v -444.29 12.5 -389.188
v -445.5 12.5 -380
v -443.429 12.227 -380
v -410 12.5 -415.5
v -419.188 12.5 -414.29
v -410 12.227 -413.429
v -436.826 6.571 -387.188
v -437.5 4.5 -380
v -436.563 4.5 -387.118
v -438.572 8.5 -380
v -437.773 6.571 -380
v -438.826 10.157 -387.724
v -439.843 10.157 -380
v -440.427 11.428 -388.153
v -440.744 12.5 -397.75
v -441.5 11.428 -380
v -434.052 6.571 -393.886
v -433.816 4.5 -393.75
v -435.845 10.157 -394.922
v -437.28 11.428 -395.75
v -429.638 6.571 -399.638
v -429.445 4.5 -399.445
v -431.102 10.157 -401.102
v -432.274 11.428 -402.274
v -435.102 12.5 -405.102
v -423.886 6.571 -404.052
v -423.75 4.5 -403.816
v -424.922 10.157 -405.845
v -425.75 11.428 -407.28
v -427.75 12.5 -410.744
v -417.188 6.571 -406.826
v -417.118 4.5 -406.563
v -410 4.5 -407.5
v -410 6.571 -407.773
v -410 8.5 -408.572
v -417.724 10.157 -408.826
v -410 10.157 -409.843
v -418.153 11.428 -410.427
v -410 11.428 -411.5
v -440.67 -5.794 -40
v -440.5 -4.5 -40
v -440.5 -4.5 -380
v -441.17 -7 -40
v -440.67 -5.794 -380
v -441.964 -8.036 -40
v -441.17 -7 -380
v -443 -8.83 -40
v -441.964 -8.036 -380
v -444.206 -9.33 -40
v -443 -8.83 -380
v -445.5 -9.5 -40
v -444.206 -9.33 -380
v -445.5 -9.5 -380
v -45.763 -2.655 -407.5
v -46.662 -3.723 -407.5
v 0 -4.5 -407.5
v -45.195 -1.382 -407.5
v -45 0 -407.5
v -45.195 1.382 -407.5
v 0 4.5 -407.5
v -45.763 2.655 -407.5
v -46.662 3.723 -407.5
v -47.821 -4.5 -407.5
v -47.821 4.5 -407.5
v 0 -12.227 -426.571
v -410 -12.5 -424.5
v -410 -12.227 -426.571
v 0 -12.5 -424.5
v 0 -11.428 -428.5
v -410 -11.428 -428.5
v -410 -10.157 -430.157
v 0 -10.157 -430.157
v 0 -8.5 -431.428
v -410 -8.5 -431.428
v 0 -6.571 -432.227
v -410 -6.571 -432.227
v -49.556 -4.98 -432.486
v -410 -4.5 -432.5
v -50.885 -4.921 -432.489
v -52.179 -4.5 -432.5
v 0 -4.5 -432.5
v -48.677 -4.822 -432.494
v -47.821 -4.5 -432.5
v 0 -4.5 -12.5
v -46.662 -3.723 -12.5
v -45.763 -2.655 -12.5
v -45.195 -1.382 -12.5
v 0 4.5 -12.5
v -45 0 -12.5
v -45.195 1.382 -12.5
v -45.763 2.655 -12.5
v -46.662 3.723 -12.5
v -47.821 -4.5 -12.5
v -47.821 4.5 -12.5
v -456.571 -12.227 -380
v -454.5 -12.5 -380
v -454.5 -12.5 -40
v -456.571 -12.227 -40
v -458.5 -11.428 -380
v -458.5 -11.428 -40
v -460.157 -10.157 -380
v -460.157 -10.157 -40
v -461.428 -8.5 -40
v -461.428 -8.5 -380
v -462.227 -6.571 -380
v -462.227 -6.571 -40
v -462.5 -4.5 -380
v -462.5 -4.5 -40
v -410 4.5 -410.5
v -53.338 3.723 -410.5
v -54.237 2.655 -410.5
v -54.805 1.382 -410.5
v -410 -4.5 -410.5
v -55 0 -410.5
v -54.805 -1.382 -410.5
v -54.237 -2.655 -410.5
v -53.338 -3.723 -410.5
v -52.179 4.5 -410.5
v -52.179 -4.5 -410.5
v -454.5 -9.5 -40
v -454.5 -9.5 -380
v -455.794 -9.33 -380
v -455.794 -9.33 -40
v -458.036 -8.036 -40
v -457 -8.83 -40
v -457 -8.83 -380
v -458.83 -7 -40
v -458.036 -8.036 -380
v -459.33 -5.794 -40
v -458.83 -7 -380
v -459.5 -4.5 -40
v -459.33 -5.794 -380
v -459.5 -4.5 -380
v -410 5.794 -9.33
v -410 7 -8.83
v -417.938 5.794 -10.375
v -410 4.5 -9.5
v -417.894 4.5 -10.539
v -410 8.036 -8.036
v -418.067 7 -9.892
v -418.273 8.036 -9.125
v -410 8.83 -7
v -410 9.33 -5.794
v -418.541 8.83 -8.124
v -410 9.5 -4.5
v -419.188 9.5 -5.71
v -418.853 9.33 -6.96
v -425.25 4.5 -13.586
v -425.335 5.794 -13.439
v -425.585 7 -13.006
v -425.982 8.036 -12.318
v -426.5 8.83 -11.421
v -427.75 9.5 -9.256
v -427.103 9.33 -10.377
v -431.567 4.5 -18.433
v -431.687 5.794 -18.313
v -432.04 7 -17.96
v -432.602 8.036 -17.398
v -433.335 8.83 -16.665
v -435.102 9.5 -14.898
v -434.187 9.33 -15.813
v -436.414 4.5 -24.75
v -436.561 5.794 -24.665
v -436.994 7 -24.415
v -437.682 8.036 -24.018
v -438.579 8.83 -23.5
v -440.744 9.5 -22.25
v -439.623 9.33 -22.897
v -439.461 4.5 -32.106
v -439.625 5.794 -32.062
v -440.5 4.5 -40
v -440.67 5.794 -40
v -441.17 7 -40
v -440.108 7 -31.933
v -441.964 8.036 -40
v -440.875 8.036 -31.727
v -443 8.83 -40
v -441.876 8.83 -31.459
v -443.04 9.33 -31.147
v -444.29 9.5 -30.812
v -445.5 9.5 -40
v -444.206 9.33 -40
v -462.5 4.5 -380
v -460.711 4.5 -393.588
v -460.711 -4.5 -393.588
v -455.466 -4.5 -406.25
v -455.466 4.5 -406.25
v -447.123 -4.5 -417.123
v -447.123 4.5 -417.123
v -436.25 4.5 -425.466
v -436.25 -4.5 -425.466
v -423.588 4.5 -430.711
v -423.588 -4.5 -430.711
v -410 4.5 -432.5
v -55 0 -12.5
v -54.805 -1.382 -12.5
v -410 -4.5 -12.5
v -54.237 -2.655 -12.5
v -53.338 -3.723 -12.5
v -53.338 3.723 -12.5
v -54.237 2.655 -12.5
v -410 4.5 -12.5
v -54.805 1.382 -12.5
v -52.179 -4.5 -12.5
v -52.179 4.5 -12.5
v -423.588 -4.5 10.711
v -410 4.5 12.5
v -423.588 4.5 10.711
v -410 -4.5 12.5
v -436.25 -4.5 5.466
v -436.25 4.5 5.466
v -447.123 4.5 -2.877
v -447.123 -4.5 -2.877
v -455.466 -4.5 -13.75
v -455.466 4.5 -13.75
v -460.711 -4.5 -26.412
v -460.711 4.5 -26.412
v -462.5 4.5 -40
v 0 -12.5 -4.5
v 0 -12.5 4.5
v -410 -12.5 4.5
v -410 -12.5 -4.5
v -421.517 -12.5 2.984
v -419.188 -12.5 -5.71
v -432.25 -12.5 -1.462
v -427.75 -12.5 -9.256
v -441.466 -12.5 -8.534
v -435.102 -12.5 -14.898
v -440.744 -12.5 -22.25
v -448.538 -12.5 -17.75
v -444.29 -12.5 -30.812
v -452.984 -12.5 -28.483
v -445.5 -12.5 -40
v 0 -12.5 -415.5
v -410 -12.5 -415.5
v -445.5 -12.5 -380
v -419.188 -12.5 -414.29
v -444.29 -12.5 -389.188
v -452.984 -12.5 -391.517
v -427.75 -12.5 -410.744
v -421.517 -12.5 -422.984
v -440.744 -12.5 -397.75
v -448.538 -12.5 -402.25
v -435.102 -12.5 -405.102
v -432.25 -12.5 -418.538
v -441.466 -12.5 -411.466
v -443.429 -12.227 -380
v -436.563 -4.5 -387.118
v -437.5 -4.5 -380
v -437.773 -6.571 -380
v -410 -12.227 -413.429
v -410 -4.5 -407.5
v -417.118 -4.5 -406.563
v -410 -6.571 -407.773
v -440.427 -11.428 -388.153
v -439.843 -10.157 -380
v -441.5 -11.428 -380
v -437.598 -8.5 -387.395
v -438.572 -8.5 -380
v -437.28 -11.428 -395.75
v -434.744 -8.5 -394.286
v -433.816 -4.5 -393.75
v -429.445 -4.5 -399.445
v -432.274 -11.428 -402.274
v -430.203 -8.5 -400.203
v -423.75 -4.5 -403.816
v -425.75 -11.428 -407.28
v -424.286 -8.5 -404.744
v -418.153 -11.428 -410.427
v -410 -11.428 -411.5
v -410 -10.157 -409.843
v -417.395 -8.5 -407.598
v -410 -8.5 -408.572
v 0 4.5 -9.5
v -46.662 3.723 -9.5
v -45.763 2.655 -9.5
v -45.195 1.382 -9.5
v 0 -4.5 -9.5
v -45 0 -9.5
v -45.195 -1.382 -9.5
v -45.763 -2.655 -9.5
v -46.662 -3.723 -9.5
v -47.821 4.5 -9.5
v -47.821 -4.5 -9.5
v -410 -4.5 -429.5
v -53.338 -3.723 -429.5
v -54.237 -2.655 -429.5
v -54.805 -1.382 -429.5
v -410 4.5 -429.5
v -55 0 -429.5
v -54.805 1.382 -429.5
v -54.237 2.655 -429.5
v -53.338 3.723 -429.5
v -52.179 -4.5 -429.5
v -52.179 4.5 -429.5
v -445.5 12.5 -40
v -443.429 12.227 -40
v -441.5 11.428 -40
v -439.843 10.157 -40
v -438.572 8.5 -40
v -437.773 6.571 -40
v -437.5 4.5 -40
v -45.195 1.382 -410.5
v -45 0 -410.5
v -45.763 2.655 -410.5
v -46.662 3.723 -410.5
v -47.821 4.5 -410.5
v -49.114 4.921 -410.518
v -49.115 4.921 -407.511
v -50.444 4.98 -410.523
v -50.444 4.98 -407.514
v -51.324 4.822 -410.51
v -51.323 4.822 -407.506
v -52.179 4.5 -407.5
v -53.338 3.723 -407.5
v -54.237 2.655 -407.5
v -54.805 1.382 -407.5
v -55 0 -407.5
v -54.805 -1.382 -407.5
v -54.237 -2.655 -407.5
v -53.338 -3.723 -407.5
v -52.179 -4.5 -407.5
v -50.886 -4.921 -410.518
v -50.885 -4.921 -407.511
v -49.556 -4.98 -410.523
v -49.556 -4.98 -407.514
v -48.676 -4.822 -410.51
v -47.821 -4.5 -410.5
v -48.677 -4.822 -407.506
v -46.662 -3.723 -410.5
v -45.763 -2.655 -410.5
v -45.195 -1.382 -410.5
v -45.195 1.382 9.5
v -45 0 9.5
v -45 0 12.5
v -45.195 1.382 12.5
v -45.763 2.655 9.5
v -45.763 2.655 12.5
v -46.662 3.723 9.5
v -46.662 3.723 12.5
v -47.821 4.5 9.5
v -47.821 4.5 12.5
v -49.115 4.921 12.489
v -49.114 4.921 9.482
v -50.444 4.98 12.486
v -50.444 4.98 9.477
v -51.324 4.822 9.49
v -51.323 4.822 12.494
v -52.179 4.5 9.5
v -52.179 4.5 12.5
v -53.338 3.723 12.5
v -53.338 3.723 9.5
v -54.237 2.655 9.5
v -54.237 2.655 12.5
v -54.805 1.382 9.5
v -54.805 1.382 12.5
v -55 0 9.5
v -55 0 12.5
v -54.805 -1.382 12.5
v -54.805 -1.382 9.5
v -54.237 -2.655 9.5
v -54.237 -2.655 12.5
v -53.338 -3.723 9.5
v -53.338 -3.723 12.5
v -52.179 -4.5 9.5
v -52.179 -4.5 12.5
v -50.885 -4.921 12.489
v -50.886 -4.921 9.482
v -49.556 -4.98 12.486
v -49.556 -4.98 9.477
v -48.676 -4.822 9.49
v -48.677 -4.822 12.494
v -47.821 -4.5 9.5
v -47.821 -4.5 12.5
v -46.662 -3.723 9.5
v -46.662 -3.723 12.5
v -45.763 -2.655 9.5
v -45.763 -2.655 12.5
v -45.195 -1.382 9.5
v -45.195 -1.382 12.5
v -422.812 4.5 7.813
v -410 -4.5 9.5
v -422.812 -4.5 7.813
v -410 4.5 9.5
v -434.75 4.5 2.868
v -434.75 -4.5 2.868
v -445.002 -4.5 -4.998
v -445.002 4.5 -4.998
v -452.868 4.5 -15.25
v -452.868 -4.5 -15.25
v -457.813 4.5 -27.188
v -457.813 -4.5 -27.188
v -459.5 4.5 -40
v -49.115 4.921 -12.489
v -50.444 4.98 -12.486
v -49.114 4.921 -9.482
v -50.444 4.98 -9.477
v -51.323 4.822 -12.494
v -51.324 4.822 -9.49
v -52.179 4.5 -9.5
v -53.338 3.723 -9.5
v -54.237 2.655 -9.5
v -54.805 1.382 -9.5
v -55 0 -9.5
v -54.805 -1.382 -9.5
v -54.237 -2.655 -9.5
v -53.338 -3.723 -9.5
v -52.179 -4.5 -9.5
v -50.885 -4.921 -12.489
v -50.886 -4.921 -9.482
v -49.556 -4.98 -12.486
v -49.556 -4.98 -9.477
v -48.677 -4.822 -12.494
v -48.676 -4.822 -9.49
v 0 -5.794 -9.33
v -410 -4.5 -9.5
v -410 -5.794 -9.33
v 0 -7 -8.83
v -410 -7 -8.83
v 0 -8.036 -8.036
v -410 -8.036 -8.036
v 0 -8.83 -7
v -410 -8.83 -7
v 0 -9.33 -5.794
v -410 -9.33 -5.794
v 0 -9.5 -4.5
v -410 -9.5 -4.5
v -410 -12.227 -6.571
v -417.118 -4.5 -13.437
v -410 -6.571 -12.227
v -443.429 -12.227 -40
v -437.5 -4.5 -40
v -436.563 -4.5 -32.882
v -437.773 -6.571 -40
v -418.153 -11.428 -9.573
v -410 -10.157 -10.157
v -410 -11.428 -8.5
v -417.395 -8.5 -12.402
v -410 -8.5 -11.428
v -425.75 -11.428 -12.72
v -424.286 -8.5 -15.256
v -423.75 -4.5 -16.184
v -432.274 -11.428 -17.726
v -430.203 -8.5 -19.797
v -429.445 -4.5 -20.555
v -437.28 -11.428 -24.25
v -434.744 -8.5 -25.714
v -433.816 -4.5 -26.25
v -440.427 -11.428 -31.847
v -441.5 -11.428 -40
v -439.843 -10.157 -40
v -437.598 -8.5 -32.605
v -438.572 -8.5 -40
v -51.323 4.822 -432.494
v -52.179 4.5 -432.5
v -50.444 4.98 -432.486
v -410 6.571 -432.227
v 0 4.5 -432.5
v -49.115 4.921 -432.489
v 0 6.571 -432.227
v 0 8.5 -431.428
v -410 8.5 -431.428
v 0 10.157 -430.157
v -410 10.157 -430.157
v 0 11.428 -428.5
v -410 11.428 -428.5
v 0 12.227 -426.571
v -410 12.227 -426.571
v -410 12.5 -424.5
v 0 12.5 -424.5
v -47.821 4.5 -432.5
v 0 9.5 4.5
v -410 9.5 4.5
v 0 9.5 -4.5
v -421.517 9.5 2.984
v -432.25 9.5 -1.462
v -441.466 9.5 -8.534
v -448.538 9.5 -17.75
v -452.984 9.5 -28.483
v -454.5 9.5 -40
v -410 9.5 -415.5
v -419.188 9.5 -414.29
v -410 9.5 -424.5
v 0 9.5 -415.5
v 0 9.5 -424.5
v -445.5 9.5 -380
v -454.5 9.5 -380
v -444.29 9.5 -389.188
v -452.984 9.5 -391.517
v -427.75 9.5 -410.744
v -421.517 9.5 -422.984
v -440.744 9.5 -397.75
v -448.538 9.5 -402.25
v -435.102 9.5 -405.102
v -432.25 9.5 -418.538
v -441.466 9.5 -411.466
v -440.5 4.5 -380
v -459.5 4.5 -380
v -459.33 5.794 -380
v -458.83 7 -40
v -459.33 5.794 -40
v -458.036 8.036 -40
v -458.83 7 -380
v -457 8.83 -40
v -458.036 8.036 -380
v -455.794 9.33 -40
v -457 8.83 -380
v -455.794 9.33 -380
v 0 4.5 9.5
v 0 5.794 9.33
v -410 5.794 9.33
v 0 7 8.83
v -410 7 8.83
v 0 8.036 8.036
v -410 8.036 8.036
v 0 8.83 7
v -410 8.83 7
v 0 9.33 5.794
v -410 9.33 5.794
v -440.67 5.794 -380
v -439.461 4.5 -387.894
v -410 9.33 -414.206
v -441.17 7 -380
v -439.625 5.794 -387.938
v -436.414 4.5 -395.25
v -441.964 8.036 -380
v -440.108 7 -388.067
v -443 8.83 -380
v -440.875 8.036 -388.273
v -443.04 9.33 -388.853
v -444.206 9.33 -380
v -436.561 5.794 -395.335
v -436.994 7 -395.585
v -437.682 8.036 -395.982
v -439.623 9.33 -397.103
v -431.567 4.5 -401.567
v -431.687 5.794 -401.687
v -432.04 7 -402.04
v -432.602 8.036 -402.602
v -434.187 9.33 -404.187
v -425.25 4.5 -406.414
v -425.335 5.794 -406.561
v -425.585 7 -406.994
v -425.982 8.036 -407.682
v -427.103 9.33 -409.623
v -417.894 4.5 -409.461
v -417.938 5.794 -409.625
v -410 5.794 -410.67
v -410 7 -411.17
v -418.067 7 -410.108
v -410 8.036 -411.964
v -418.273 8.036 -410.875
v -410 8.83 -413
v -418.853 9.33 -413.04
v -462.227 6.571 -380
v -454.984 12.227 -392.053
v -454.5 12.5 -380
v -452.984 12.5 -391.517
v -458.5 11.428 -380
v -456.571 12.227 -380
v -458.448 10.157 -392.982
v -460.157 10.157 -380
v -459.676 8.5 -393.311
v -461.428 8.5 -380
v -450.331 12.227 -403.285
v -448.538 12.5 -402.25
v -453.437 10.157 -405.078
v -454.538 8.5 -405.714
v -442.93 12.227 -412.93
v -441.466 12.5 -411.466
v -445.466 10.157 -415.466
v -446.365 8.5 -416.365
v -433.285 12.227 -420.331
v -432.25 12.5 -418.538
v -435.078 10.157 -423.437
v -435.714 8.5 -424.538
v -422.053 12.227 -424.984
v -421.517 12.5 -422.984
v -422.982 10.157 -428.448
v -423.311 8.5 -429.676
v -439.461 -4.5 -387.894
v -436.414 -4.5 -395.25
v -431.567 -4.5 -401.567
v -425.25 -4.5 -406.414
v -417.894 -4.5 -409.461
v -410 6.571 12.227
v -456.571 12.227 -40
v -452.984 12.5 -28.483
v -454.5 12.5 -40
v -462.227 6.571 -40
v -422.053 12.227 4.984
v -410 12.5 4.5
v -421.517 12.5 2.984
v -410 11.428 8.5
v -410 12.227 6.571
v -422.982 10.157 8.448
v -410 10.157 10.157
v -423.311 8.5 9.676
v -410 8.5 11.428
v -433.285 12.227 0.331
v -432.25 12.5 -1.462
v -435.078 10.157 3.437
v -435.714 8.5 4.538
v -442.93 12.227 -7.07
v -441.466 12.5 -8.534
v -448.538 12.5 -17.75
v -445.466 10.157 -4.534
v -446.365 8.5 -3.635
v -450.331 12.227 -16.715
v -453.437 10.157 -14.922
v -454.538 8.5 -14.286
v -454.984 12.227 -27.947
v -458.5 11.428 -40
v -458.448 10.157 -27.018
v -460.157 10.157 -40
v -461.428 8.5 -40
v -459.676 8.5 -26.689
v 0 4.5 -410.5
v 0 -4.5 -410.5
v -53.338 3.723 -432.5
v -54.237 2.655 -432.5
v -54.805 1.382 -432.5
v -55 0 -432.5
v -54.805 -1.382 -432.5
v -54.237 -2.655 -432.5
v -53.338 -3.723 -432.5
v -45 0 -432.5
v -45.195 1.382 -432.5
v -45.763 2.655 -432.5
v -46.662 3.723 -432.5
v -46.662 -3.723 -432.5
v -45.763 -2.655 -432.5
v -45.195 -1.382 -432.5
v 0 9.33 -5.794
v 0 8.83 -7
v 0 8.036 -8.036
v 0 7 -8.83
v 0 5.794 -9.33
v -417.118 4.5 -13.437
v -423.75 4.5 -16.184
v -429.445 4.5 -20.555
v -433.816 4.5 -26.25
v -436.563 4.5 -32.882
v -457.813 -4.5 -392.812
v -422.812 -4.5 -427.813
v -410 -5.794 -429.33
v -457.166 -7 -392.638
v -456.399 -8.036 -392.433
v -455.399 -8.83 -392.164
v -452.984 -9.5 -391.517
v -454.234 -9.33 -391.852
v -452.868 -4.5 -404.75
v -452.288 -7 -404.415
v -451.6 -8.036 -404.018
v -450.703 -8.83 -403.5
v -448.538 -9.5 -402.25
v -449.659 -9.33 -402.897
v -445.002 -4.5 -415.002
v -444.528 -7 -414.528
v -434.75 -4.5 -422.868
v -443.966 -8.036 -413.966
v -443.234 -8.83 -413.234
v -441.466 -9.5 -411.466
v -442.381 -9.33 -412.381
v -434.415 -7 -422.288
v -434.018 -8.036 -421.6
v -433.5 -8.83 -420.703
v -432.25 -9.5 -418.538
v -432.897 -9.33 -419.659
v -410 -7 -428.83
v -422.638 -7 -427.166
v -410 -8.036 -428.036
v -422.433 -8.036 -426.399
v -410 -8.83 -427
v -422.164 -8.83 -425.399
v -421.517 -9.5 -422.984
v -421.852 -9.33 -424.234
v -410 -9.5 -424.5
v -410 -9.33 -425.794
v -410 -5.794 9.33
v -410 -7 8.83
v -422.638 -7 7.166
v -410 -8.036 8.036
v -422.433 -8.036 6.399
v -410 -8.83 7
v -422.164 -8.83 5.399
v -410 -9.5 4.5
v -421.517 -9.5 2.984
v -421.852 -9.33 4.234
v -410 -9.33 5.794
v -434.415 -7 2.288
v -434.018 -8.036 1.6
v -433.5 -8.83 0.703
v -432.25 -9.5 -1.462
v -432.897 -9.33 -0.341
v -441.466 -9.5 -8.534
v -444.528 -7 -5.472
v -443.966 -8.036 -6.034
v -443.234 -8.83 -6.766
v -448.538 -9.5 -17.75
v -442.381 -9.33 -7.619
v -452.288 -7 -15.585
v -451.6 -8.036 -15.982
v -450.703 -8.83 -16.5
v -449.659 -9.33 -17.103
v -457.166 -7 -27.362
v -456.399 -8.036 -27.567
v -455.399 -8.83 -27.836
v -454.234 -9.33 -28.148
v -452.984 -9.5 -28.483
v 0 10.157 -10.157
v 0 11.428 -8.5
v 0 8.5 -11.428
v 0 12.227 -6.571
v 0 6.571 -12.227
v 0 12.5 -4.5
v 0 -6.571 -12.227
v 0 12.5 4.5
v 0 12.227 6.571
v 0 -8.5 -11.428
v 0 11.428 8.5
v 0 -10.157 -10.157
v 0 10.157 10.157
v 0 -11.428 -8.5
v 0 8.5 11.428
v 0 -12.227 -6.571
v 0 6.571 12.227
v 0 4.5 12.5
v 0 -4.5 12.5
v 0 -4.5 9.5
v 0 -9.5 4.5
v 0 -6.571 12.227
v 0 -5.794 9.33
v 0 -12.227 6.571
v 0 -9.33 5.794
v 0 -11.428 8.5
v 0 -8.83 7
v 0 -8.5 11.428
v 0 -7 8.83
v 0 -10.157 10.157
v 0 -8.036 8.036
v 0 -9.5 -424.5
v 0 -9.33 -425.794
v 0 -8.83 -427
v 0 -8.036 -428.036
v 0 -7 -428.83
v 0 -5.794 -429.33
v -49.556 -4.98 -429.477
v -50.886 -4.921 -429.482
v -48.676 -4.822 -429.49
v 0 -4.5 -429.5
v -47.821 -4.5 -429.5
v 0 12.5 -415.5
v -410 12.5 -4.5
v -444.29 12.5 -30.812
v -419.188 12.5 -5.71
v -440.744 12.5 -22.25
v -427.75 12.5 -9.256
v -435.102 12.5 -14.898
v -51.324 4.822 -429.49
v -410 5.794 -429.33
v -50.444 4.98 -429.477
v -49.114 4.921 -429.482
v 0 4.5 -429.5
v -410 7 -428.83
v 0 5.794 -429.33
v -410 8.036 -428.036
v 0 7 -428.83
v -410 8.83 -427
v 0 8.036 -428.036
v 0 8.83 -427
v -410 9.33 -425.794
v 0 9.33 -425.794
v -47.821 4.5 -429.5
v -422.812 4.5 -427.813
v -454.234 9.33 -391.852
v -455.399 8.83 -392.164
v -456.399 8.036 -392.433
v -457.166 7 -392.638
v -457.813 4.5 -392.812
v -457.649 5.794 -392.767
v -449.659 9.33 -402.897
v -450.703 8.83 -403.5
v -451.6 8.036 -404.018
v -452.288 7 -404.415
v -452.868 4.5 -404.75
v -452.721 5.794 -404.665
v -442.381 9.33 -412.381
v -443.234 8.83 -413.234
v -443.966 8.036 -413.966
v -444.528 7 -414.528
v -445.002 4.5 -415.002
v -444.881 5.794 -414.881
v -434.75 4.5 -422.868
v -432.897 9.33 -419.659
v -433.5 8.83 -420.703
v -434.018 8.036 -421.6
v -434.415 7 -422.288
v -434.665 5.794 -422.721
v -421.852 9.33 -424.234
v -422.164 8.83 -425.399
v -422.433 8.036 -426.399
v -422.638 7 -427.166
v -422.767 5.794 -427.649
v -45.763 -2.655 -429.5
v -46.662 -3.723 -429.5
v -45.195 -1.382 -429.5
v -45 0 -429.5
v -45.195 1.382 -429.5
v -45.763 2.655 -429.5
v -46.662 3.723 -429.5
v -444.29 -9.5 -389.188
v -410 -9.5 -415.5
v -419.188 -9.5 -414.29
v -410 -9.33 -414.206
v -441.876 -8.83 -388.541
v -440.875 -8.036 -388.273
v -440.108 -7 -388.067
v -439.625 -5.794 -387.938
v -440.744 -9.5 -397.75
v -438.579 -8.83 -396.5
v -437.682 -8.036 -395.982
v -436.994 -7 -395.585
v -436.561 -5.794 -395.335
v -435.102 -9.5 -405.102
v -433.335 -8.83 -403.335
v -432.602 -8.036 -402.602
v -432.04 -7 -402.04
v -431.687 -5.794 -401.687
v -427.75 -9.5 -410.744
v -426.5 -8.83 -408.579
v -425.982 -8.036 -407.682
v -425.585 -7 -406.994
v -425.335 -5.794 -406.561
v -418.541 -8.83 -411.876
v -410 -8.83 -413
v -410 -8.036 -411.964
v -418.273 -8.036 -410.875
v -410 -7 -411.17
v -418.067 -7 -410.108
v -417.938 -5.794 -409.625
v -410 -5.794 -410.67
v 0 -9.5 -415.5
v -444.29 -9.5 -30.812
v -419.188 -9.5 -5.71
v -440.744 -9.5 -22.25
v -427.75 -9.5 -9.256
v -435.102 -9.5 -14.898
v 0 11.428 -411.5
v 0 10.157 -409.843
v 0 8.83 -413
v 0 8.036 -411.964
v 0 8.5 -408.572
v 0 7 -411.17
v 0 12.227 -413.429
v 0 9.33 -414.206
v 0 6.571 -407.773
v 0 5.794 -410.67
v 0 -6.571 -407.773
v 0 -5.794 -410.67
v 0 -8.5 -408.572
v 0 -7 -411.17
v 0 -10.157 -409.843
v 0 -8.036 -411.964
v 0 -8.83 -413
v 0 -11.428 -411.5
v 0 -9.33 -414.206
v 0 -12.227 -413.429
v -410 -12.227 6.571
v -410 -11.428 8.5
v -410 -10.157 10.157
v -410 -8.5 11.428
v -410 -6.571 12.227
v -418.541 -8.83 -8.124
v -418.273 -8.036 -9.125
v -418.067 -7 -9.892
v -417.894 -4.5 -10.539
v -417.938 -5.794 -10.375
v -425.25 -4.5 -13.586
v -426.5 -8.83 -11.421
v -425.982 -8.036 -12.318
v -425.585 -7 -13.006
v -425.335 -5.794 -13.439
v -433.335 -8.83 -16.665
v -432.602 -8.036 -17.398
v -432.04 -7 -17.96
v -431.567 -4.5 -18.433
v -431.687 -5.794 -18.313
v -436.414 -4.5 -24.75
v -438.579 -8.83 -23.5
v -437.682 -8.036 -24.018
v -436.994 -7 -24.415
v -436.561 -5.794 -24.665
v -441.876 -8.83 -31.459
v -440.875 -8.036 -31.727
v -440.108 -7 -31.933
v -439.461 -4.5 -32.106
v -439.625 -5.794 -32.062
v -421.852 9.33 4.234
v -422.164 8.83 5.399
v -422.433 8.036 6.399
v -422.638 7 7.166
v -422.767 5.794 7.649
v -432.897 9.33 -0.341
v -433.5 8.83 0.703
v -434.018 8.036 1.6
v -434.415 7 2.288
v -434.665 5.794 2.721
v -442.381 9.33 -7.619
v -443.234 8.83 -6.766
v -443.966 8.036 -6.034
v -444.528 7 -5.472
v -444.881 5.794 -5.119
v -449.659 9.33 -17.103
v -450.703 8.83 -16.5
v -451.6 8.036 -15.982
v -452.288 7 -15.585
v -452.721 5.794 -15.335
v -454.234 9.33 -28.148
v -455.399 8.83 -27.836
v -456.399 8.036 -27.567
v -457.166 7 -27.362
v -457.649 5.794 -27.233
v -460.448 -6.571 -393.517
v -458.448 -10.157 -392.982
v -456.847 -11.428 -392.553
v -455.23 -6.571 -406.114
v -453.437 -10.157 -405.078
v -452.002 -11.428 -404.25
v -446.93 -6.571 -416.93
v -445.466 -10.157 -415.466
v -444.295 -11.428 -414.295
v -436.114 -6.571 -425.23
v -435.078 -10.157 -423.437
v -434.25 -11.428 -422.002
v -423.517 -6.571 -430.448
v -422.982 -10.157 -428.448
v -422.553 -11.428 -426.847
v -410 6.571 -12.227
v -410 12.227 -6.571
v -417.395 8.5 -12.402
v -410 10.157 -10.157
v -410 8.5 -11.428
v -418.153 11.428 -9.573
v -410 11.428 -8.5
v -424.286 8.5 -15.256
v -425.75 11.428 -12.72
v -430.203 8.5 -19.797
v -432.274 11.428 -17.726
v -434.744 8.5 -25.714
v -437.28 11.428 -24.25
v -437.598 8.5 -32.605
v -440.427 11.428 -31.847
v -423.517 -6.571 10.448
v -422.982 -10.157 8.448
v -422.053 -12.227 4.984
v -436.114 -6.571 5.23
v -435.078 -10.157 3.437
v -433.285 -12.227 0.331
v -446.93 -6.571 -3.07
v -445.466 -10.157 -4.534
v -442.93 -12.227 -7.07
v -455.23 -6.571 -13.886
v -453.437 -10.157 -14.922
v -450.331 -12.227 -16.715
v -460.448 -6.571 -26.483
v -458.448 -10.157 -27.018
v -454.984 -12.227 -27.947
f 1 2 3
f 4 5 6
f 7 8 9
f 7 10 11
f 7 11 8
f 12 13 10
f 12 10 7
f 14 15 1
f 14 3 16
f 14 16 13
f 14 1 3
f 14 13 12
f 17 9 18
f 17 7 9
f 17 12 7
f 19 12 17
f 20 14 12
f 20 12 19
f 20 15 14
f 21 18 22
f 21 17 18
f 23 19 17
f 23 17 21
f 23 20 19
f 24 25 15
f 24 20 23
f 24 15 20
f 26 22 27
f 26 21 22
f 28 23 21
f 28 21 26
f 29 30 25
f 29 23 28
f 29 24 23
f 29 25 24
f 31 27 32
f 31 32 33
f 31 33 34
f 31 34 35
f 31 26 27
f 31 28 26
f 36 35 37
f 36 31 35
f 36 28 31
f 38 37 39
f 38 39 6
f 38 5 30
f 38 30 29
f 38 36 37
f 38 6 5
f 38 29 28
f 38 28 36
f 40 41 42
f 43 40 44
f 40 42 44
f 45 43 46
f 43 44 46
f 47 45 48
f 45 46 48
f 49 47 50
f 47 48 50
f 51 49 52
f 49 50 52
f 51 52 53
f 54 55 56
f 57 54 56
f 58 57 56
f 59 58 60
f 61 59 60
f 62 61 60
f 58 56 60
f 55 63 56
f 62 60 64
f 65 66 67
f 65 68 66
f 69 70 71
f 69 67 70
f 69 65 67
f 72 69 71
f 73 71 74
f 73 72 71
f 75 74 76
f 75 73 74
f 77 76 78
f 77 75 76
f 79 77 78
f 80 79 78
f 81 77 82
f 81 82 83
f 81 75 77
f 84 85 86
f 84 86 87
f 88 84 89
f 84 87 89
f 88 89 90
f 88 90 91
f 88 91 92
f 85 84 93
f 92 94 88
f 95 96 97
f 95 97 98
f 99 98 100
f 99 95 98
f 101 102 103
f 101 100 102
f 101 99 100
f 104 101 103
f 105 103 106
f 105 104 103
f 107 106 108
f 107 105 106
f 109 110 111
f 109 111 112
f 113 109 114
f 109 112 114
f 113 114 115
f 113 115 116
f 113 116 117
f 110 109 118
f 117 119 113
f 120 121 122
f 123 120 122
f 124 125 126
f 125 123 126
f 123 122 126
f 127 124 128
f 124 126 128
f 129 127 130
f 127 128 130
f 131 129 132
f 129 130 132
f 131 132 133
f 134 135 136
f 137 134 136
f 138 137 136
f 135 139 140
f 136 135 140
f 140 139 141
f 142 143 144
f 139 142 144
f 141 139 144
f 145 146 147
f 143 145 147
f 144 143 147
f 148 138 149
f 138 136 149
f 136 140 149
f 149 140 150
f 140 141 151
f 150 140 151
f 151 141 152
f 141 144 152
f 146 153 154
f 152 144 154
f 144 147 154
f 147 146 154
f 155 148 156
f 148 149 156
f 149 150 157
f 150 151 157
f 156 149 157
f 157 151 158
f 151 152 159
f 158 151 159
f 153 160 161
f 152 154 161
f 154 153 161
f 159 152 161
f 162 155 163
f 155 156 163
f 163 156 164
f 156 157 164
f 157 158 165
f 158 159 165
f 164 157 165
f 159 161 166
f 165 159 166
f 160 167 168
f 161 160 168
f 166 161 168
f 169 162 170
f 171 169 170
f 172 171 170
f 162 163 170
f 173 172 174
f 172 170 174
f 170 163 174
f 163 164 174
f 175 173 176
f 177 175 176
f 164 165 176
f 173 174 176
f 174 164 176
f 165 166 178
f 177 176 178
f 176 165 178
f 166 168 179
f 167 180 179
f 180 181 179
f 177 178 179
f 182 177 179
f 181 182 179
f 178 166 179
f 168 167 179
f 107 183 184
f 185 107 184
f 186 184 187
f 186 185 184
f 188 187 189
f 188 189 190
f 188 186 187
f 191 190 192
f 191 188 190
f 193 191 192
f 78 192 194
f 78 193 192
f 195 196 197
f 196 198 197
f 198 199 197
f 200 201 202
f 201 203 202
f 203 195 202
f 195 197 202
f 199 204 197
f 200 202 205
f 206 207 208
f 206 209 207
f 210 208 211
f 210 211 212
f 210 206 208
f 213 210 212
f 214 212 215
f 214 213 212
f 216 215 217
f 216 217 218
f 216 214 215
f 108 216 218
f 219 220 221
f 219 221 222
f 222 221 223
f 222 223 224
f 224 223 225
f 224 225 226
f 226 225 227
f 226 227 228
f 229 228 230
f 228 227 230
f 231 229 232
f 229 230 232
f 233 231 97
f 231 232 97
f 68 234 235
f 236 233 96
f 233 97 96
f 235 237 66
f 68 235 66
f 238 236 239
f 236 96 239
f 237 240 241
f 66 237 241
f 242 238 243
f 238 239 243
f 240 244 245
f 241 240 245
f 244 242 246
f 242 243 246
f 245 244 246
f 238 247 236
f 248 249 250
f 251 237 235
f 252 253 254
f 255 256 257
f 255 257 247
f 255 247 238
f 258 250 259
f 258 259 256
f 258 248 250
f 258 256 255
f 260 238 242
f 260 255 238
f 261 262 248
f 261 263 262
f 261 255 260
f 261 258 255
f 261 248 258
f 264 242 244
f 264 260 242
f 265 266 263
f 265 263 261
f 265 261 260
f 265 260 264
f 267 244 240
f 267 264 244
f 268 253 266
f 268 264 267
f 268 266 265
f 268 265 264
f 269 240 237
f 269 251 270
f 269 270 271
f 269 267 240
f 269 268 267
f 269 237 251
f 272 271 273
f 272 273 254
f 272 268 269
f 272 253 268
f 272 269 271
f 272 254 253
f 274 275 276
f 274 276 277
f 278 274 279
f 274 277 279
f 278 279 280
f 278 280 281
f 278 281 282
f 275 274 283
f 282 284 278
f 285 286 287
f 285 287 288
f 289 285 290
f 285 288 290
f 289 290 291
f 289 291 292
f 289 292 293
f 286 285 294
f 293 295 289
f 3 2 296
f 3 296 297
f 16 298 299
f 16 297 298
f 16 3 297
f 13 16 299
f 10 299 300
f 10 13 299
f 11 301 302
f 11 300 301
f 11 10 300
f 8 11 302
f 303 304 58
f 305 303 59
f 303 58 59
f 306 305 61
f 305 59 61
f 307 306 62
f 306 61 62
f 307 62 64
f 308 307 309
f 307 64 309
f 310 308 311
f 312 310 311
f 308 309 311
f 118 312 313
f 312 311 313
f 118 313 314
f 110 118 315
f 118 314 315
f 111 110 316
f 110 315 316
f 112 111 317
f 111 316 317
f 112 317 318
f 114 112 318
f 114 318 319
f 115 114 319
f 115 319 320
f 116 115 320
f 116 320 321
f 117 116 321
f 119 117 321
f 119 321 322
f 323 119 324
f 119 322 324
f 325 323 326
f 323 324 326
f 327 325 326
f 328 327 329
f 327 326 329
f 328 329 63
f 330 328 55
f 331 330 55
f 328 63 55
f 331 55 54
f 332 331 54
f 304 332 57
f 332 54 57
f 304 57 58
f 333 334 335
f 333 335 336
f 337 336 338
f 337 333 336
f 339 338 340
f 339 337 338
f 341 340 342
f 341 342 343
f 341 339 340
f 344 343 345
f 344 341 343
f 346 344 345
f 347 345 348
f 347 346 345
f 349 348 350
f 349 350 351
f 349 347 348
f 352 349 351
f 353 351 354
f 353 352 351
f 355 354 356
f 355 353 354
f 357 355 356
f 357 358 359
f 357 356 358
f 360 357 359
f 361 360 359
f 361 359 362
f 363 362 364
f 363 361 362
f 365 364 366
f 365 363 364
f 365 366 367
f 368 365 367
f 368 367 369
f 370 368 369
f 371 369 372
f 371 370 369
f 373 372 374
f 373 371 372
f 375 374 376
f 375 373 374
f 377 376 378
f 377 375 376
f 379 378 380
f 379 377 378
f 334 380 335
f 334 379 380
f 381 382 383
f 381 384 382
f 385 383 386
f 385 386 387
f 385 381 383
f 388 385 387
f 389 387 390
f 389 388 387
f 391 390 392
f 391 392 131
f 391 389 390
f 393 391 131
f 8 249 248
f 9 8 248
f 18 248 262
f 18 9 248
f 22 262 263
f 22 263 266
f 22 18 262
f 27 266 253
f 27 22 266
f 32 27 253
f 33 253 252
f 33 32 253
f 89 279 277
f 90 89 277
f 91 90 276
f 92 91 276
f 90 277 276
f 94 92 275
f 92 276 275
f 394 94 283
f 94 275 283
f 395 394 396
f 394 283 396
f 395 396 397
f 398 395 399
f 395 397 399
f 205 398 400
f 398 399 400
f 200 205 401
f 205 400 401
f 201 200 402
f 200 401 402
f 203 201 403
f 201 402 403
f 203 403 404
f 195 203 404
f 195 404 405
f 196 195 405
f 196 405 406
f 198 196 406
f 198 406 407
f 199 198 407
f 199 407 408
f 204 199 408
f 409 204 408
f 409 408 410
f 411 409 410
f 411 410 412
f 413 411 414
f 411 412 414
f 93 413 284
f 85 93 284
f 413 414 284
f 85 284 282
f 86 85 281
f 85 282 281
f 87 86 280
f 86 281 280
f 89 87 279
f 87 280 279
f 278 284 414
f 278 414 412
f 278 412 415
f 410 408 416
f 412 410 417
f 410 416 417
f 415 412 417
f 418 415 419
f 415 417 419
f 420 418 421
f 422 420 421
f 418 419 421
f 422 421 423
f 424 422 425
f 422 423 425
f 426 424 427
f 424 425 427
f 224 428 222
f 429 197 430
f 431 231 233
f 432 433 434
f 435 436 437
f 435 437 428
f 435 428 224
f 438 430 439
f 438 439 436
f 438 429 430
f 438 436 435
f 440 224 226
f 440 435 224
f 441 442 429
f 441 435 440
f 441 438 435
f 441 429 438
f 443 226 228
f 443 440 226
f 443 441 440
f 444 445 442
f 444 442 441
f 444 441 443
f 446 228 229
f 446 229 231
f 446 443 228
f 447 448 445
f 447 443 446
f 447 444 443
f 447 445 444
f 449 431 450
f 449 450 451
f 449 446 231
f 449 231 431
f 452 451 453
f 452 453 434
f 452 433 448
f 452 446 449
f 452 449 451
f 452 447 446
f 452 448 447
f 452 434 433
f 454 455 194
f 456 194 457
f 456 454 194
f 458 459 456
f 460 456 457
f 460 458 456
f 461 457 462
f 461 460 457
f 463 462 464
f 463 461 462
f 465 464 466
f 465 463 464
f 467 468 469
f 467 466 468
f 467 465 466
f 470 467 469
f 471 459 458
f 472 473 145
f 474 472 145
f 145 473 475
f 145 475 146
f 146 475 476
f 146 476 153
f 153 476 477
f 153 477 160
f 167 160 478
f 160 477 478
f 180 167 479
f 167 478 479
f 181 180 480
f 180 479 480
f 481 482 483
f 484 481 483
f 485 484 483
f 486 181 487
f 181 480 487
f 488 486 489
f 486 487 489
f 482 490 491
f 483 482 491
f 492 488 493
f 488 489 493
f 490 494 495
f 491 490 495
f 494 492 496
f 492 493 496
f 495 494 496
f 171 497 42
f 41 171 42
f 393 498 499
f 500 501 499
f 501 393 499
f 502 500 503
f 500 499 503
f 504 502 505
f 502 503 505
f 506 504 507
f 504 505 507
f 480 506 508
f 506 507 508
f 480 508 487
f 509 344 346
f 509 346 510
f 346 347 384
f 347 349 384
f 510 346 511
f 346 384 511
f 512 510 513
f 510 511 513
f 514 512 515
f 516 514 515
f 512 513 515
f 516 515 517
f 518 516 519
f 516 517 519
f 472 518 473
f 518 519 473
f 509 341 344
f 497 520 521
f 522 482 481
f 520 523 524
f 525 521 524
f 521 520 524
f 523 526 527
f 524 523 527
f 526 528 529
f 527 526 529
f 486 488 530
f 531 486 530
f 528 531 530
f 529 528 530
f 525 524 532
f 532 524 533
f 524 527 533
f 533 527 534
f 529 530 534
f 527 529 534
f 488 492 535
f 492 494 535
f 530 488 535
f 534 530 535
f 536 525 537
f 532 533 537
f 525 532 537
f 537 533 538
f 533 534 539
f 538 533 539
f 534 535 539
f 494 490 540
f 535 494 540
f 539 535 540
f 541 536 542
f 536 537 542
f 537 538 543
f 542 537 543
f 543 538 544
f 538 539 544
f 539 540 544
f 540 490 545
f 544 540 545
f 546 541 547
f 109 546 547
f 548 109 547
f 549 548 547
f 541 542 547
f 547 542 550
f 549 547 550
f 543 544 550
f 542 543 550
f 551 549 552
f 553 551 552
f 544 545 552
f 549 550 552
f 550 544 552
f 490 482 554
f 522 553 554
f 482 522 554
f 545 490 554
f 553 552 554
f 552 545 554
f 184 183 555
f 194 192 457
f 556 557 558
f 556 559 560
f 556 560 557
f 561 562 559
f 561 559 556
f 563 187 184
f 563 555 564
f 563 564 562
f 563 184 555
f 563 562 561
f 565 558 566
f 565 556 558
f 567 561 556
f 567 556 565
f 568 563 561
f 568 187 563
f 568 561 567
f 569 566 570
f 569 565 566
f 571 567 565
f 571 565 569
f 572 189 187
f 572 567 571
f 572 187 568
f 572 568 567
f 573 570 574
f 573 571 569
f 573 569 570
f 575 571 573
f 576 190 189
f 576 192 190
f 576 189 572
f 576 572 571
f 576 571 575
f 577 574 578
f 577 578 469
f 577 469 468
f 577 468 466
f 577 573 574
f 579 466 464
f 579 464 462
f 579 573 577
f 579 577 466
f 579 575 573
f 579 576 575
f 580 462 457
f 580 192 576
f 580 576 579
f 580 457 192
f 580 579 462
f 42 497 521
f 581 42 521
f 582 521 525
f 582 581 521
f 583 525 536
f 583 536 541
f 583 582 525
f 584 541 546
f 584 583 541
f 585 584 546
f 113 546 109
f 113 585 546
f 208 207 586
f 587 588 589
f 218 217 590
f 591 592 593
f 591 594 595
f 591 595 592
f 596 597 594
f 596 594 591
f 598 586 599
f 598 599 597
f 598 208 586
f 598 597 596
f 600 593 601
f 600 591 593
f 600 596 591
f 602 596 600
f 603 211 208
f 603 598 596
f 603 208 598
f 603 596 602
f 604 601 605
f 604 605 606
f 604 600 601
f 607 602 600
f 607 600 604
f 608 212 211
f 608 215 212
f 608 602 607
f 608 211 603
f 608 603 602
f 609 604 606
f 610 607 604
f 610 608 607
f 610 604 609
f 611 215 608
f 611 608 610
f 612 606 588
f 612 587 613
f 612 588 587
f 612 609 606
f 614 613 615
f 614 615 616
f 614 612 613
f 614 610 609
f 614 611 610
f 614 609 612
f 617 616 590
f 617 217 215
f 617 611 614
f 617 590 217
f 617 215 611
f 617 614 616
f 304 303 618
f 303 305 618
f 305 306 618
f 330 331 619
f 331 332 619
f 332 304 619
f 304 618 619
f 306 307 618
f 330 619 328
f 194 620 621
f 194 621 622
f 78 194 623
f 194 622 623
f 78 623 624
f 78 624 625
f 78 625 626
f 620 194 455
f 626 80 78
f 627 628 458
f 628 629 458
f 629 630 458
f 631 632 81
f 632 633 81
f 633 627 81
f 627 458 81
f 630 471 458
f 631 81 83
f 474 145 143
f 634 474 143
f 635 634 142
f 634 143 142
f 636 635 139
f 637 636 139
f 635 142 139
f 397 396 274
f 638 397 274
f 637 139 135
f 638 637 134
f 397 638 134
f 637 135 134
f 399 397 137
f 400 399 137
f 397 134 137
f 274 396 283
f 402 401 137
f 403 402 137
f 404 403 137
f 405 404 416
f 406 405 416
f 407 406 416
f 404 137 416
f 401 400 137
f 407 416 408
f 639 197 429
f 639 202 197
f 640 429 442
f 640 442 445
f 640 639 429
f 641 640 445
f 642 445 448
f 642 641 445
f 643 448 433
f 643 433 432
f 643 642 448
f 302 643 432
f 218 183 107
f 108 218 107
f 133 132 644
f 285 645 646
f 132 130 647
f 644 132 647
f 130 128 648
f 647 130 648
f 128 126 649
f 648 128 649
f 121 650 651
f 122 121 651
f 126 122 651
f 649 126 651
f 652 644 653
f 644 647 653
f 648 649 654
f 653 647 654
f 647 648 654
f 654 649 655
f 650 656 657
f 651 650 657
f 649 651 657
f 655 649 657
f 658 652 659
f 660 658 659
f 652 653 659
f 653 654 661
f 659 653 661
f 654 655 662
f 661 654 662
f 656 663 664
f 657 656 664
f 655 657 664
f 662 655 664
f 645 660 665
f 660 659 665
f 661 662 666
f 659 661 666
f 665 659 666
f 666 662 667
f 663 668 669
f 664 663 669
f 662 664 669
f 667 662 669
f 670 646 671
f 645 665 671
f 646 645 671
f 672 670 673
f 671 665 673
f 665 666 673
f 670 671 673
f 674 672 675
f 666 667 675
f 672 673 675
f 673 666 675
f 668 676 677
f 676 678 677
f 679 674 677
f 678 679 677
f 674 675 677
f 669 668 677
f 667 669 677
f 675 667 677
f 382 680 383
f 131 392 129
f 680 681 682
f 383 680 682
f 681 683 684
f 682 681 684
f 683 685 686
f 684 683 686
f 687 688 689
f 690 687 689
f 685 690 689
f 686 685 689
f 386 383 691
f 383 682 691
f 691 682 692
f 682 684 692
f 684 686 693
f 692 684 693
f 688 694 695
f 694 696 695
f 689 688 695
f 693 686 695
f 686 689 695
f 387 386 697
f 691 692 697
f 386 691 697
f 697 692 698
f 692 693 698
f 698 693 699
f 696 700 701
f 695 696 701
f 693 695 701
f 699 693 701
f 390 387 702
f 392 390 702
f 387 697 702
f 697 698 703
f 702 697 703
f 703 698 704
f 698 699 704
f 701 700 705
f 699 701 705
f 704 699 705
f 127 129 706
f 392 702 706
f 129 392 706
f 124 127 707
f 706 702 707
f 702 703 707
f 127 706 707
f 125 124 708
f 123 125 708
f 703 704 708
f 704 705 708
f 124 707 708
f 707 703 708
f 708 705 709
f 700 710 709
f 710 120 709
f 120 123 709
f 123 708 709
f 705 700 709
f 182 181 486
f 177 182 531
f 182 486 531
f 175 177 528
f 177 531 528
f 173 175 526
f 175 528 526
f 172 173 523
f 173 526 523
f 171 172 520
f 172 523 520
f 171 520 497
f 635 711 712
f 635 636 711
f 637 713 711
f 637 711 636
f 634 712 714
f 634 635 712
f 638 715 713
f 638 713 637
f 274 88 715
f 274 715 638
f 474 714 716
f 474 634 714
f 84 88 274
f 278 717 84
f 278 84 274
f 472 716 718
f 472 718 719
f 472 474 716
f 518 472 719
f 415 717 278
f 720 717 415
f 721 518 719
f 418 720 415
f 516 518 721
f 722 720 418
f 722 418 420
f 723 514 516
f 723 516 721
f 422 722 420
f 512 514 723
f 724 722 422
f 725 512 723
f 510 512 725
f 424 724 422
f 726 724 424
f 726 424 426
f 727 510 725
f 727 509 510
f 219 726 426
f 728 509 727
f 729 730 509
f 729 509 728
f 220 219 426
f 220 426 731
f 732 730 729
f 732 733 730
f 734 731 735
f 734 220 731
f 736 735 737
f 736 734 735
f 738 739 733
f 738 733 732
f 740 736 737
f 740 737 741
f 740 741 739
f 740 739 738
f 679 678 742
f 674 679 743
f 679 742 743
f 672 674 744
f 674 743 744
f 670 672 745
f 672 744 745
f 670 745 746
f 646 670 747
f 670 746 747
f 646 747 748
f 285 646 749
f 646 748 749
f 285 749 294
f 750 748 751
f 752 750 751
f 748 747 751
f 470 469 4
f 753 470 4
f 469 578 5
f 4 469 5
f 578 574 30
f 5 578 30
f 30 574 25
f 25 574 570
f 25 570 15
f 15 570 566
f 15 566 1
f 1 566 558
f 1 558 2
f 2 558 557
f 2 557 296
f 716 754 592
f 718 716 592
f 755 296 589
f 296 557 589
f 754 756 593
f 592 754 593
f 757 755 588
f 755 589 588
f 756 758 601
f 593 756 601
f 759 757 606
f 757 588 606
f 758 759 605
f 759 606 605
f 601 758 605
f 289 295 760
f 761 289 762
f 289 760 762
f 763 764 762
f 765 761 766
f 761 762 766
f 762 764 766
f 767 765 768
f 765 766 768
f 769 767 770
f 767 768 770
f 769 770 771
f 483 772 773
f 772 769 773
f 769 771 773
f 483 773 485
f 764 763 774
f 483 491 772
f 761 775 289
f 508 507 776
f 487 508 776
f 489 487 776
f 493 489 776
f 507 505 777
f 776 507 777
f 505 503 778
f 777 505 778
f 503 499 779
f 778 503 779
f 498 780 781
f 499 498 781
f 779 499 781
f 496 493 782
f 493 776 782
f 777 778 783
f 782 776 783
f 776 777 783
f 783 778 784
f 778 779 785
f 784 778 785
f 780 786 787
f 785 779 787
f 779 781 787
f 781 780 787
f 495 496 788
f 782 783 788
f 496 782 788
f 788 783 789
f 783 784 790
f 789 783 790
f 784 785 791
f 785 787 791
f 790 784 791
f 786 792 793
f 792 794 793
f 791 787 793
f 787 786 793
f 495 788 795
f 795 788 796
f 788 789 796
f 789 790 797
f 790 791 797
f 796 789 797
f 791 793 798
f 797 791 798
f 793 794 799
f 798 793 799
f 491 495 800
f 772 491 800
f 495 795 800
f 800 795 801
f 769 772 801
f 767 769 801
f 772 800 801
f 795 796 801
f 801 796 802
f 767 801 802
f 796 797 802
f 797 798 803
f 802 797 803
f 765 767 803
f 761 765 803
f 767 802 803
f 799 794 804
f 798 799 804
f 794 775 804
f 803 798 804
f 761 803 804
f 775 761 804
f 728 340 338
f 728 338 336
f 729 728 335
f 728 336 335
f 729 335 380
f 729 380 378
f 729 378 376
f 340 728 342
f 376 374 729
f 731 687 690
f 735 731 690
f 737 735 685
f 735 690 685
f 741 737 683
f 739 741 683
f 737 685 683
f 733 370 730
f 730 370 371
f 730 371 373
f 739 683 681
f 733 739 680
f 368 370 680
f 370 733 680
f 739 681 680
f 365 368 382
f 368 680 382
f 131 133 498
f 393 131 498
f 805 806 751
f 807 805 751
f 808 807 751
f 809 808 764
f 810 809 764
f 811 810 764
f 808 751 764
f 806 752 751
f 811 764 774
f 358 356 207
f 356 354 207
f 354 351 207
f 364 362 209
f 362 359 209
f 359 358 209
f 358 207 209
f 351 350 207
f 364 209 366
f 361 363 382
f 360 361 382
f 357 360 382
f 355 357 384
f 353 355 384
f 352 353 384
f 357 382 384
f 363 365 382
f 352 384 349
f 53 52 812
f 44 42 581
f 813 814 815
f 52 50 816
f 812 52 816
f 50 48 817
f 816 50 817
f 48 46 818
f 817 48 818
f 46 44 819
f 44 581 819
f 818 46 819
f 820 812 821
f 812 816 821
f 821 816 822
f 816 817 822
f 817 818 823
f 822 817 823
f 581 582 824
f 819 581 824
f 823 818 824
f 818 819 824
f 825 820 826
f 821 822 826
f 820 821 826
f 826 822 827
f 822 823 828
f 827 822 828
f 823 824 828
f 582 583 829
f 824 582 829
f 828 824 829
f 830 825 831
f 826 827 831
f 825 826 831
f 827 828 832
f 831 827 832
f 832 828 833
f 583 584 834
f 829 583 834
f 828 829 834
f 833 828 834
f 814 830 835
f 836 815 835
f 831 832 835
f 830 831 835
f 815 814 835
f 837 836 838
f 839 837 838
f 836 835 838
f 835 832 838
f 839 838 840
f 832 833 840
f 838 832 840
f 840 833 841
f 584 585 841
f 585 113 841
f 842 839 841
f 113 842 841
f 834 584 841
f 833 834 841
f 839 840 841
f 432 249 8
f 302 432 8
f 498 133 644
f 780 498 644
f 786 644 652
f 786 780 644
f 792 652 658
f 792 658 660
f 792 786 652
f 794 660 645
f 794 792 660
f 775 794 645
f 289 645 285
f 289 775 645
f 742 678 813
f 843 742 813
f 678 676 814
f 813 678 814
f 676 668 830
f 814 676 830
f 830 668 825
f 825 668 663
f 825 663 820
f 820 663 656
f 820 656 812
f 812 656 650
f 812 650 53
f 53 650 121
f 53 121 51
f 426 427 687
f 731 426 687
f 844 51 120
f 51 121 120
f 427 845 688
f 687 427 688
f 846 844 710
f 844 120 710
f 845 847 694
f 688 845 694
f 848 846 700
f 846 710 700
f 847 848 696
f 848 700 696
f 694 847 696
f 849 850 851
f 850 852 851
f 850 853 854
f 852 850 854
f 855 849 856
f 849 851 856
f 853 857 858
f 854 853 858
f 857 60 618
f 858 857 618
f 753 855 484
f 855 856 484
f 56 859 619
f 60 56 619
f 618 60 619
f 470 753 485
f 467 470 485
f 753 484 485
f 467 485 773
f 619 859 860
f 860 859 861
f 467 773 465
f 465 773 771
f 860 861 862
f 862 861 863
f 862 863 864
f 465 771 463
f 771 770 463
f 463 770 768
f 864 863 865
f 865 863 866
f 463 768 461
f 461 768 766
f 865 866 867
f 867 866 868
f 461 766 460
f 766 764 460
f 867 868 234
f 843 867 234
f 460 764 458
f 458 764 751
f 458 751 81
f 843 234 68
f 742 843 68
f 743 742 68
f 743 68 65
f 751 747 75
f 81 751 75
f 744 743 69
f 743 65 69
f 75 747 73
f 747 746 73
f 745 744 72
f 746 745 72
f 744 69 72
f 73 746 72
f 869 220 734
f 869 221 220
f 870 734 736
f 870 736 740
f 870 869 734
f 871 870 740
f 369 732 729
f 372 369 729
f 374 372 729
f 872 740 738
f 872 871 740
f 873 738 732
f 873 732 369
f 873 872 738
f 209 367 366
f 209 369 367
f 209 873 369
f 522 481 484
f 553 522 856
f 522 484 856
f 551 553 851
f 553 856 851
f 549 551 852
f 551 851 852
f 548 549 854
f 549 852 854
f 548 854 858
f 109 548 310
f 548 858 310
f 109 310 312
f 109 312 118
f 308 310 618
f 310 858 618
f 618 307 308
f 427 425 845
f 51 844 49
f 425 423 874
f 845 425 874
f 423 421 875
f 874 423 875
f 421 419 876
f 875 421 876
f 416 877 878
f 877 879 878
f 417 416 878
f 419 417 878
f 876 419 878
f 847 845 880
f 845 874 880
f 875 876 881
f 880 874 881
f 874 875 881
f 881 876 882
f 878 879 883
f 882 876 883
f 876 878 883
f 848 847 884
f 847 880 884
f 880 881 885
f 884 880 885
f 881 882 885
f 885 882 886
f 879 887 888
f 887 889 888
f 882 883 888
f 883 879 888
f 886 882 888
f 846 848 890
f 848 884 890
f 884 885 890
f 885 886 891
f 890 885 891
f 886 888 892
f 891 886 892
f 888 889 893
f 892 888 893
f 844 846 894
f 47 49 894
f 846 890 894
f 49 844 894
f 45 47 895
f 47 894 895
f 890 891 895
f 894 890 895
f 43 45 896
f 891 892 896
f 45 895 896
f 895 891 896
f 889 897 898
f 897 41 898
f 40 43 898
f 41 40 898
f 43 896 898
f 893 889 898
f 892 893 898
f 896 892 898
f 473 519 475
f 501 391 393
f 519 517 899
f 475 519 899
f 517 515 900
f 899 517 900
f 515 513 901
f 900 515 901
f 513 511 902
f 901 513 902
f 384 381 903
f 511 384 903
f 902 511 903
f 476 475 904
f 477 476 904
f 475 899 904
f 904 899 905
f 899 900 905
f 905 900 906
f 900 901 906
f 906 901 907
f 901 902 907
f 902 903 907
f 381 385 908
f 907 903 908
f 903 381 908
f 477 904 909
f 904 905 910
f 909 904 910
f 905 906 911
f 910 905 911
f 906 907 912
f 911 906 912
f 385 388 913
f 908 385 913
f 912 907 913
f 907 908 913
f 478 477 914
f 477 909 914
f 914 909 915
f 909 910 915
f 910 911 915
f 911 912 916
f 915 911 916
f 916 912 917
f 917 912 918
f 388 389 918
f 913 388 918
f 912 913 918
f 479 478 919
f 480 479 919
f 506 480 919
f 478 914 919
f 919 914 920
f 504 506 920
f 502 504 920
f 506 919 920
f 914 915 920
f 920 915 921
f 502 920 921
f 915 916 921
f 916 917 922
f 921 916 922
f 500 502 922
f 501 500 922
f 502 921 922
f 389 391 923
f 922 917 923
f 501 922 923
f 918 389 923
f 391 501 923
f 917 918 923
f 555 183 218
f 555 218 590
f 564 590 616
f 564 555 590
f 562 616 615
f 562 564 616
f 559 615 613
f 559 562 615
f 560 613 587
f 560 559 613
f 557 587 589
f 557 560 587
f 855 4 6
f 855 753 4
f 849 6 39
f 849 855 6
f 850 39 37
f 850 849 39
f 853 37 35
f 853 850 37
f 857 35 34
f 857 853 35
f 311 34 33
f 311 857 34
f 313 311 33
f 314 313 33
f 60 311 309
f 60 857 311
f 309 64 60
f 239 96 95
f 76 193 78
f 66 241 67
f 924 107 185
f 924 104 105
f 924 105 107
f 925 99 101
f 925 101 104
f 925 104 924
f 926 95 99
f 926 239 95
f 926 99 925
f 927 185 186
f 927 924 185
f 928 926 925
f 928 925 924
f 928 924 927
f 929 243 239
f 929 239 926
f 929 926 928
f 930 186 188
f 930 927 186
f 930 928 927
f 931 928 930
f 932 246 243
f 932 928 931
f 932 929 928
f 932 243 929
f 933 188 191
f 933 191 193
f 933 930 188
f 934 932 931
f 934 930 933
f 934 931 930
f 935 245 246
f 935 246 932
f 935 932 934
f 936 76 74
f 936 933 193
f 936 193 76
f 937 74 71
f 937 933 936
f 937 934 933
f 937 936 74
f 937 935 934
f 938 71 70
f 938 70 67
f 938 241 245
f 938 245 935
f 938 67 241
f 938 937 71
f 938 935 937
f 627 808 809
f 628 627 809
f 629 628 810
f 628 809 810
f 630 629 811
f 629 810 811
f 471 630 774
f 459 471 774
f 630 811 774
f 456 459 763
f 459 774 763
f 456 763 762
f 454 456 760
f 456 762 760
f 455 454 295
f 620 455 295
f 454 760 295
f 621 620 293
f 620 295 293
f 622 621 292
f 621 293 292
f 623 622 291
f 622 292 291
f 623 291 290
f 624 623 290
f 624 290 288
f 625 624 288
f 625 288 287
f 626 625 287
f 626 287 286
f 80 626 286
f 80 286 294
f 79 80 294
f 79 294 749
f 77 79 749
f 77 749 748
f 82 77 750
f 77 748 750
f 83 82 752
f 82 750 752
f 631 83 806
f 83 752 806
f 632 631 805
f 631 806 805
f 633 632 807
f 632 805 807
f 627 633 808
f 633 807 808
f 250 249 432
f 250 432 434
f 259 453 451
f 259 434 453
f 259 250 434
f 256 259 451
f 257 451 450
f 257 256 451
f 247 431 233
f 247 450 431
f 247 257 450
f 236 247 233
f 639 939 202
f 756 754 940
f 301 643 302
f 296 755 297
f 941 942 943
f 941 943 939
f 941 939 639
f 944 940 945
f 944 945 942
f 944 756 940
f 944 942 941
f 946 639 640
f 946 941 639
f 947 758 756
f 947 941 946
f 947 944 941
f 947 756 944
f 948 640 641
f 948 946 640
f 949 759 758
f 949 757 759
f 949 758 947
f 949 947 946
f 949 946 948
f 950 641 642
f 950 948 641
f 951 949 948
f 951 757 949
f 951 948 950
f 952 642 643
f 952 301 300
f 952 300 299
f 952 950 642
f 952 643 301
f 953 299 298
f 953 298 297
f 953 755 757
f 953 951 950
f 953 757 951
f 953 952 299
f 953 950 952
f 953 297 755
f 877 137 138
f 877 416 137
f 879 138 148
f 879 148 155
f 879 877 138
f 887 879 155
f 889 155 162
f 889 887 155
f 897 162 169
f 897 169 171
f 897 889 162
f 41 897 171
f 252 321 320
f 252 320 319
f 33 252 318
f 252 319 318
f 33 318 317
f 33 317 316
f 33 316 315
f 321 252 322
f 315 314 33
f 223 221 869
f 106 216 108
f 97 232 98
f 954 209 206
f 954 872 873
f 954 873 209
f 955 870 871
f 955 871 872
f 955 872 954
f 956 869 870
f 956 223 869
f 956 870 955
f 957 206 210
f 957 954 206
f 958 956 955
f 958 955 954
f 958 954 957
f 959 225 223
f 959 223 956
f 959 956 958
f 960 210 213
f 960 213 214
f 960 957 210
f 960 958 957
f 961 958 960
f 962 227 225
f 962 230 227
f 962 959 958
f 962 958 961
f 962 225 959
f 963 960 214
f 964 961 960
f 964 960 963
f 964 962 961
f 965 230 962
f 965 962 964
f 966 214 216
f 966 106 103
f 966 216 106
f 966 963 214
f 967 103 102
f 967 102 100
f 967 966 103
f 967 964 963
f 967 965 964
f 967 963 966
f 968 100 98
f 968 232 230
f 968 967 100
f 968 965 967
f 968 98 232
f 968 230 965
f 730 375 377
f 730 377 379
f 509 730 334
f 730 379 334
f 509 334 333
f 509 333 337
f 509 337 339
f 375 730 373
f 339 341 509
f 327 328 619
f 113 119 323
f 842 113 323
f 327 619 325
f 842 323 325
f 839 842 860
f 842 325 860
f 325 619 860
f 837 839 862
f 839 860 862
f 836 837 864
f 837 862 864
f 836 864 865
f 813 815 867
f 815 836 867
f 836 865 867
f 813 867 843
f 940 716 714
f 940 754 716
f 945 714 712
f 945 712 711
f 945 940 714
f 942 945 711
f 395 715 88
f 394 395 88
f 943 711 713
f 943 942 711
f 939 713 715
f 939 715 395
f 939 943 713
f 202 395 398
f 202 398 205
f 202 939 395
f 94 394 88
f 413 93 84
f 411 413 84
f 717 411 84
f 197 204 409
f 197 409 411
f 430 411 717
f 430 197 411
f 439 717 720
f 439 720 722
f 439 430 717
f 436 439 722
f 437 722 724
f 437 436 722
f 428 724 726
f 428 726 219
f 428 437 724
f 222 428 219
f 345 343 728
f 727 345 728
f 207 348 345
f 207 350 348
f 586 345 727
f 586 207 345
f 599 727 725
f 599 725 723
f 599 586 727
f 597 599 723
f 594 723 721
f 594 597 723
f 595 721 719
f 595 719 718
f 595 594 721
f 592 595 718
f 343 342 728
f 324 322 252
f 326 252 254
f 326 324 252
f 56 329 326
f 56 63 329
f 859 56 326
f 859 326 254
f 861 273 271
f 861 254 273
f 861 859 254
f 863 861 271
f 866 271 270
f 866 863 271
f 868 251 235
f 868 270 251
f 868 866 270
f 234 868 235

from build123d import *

# Parameters (mm, degrees)
SKETCH3_R               = 5
CUT_EXTRUDE1_DEPTH      = 13.5000001
CUT_EXTRUDE1_DEPTH_BACK = 433.5000001


with BuildPart() as part:
    # Sweep-Thin1: sweep along a path in Sketch1
    with BuildLine(Plane(origin=(0, 0, 0), x_dir=(1, 0, 0), z_dir=(0, 1, 0))) as sweep_thin1_path:
        Line((0, 0), (-410, 0))
        ThreePointArc((-410, 0), (-438.284271247, 11.715728753), (-450, 40))
        Line((-450, 40), (-450, 380))
        ThreePointArc((-450, 380), (-438.284271247, 408.284271247), (-410, 420))
        Line((-410, 420), (0, 420))
    # Sketch2 → Sweep-Thin1 (sweep)
    with BuildSketch(Plane(origin=(0, 0, 0), x_dir=(0, 0, -1), z_dir=(1, 0, 0))):
        with BuildLine():
            Line((4.5, 12.5), (-4.5, 12.5))
            ThreePointArc((-4.5, 12.5), (-10.156854249, 10.156854249), (-12.5, 4.5))
            Line((-12.5, 4.5), (-12.5, -4.5))
            ThreePointArc((-12.5, -4.5), (-10.156854249, -10.156854249), (-4.5, -12.5))
            Line((-4.5, -12.5), (4.5, -12.5))
            ThreePointArc((4.5, -12.5), (10.156854249, -10.156854249), (12.5, -4.5))
            Line((12.5, -4.5), (12.5, 4.5))
            ThreePointArc((12.5, 4.5), (10.156854249, 10.156854249), (4.5, 12.5))
        make_face()
        with BuildLine():
            Line((4.5, 9.5), (-4.5, 9.5))
            ThreePointArc((-4.5, 9.5), (-8.035533906, 8.035533906), (-9.5, 4.5))
            Line((-9.5, 4.5), (-9.5, -4.5))
            ThreePointArc((-9.5, -4.5), (-8.035533906, -8.035533906), (-4.5, -9.5))
            Line((-4.5, -9.5), (4.5, -9.5))
            ThreePointArc((4.5, -9.5), (8.035533906, -8.035533906), (9.5, -4.5))
            Line((9.5, -4.5), (9.5, 4.5))
            ThreePointArc((9.5, 4.5), (8.035533906, 8.035533906), (4.5, 9.5))
        make_face(mode=Mode.SUBTRACT)
    sweep(path=sweep_thin1_path.line)

    # Sketch3 → Cut-Extrude1 (cut, two sides)
    with BuildSketch(Plane.XY) as cut_extrude1_sk:
        with Locations((-50, 0)):
            Circle(SKETCH3_R)
    extrude(amount=CUT_EXTRUDE1_DEPTH, mode=Mode.SUBTRACT)
    extrude(cut_extrude1_sk.sketch, amount=-CUT_EXTRUDE1_DEPTH_BACK, mode=Mode.SUBTRACT)


solid = part.part
